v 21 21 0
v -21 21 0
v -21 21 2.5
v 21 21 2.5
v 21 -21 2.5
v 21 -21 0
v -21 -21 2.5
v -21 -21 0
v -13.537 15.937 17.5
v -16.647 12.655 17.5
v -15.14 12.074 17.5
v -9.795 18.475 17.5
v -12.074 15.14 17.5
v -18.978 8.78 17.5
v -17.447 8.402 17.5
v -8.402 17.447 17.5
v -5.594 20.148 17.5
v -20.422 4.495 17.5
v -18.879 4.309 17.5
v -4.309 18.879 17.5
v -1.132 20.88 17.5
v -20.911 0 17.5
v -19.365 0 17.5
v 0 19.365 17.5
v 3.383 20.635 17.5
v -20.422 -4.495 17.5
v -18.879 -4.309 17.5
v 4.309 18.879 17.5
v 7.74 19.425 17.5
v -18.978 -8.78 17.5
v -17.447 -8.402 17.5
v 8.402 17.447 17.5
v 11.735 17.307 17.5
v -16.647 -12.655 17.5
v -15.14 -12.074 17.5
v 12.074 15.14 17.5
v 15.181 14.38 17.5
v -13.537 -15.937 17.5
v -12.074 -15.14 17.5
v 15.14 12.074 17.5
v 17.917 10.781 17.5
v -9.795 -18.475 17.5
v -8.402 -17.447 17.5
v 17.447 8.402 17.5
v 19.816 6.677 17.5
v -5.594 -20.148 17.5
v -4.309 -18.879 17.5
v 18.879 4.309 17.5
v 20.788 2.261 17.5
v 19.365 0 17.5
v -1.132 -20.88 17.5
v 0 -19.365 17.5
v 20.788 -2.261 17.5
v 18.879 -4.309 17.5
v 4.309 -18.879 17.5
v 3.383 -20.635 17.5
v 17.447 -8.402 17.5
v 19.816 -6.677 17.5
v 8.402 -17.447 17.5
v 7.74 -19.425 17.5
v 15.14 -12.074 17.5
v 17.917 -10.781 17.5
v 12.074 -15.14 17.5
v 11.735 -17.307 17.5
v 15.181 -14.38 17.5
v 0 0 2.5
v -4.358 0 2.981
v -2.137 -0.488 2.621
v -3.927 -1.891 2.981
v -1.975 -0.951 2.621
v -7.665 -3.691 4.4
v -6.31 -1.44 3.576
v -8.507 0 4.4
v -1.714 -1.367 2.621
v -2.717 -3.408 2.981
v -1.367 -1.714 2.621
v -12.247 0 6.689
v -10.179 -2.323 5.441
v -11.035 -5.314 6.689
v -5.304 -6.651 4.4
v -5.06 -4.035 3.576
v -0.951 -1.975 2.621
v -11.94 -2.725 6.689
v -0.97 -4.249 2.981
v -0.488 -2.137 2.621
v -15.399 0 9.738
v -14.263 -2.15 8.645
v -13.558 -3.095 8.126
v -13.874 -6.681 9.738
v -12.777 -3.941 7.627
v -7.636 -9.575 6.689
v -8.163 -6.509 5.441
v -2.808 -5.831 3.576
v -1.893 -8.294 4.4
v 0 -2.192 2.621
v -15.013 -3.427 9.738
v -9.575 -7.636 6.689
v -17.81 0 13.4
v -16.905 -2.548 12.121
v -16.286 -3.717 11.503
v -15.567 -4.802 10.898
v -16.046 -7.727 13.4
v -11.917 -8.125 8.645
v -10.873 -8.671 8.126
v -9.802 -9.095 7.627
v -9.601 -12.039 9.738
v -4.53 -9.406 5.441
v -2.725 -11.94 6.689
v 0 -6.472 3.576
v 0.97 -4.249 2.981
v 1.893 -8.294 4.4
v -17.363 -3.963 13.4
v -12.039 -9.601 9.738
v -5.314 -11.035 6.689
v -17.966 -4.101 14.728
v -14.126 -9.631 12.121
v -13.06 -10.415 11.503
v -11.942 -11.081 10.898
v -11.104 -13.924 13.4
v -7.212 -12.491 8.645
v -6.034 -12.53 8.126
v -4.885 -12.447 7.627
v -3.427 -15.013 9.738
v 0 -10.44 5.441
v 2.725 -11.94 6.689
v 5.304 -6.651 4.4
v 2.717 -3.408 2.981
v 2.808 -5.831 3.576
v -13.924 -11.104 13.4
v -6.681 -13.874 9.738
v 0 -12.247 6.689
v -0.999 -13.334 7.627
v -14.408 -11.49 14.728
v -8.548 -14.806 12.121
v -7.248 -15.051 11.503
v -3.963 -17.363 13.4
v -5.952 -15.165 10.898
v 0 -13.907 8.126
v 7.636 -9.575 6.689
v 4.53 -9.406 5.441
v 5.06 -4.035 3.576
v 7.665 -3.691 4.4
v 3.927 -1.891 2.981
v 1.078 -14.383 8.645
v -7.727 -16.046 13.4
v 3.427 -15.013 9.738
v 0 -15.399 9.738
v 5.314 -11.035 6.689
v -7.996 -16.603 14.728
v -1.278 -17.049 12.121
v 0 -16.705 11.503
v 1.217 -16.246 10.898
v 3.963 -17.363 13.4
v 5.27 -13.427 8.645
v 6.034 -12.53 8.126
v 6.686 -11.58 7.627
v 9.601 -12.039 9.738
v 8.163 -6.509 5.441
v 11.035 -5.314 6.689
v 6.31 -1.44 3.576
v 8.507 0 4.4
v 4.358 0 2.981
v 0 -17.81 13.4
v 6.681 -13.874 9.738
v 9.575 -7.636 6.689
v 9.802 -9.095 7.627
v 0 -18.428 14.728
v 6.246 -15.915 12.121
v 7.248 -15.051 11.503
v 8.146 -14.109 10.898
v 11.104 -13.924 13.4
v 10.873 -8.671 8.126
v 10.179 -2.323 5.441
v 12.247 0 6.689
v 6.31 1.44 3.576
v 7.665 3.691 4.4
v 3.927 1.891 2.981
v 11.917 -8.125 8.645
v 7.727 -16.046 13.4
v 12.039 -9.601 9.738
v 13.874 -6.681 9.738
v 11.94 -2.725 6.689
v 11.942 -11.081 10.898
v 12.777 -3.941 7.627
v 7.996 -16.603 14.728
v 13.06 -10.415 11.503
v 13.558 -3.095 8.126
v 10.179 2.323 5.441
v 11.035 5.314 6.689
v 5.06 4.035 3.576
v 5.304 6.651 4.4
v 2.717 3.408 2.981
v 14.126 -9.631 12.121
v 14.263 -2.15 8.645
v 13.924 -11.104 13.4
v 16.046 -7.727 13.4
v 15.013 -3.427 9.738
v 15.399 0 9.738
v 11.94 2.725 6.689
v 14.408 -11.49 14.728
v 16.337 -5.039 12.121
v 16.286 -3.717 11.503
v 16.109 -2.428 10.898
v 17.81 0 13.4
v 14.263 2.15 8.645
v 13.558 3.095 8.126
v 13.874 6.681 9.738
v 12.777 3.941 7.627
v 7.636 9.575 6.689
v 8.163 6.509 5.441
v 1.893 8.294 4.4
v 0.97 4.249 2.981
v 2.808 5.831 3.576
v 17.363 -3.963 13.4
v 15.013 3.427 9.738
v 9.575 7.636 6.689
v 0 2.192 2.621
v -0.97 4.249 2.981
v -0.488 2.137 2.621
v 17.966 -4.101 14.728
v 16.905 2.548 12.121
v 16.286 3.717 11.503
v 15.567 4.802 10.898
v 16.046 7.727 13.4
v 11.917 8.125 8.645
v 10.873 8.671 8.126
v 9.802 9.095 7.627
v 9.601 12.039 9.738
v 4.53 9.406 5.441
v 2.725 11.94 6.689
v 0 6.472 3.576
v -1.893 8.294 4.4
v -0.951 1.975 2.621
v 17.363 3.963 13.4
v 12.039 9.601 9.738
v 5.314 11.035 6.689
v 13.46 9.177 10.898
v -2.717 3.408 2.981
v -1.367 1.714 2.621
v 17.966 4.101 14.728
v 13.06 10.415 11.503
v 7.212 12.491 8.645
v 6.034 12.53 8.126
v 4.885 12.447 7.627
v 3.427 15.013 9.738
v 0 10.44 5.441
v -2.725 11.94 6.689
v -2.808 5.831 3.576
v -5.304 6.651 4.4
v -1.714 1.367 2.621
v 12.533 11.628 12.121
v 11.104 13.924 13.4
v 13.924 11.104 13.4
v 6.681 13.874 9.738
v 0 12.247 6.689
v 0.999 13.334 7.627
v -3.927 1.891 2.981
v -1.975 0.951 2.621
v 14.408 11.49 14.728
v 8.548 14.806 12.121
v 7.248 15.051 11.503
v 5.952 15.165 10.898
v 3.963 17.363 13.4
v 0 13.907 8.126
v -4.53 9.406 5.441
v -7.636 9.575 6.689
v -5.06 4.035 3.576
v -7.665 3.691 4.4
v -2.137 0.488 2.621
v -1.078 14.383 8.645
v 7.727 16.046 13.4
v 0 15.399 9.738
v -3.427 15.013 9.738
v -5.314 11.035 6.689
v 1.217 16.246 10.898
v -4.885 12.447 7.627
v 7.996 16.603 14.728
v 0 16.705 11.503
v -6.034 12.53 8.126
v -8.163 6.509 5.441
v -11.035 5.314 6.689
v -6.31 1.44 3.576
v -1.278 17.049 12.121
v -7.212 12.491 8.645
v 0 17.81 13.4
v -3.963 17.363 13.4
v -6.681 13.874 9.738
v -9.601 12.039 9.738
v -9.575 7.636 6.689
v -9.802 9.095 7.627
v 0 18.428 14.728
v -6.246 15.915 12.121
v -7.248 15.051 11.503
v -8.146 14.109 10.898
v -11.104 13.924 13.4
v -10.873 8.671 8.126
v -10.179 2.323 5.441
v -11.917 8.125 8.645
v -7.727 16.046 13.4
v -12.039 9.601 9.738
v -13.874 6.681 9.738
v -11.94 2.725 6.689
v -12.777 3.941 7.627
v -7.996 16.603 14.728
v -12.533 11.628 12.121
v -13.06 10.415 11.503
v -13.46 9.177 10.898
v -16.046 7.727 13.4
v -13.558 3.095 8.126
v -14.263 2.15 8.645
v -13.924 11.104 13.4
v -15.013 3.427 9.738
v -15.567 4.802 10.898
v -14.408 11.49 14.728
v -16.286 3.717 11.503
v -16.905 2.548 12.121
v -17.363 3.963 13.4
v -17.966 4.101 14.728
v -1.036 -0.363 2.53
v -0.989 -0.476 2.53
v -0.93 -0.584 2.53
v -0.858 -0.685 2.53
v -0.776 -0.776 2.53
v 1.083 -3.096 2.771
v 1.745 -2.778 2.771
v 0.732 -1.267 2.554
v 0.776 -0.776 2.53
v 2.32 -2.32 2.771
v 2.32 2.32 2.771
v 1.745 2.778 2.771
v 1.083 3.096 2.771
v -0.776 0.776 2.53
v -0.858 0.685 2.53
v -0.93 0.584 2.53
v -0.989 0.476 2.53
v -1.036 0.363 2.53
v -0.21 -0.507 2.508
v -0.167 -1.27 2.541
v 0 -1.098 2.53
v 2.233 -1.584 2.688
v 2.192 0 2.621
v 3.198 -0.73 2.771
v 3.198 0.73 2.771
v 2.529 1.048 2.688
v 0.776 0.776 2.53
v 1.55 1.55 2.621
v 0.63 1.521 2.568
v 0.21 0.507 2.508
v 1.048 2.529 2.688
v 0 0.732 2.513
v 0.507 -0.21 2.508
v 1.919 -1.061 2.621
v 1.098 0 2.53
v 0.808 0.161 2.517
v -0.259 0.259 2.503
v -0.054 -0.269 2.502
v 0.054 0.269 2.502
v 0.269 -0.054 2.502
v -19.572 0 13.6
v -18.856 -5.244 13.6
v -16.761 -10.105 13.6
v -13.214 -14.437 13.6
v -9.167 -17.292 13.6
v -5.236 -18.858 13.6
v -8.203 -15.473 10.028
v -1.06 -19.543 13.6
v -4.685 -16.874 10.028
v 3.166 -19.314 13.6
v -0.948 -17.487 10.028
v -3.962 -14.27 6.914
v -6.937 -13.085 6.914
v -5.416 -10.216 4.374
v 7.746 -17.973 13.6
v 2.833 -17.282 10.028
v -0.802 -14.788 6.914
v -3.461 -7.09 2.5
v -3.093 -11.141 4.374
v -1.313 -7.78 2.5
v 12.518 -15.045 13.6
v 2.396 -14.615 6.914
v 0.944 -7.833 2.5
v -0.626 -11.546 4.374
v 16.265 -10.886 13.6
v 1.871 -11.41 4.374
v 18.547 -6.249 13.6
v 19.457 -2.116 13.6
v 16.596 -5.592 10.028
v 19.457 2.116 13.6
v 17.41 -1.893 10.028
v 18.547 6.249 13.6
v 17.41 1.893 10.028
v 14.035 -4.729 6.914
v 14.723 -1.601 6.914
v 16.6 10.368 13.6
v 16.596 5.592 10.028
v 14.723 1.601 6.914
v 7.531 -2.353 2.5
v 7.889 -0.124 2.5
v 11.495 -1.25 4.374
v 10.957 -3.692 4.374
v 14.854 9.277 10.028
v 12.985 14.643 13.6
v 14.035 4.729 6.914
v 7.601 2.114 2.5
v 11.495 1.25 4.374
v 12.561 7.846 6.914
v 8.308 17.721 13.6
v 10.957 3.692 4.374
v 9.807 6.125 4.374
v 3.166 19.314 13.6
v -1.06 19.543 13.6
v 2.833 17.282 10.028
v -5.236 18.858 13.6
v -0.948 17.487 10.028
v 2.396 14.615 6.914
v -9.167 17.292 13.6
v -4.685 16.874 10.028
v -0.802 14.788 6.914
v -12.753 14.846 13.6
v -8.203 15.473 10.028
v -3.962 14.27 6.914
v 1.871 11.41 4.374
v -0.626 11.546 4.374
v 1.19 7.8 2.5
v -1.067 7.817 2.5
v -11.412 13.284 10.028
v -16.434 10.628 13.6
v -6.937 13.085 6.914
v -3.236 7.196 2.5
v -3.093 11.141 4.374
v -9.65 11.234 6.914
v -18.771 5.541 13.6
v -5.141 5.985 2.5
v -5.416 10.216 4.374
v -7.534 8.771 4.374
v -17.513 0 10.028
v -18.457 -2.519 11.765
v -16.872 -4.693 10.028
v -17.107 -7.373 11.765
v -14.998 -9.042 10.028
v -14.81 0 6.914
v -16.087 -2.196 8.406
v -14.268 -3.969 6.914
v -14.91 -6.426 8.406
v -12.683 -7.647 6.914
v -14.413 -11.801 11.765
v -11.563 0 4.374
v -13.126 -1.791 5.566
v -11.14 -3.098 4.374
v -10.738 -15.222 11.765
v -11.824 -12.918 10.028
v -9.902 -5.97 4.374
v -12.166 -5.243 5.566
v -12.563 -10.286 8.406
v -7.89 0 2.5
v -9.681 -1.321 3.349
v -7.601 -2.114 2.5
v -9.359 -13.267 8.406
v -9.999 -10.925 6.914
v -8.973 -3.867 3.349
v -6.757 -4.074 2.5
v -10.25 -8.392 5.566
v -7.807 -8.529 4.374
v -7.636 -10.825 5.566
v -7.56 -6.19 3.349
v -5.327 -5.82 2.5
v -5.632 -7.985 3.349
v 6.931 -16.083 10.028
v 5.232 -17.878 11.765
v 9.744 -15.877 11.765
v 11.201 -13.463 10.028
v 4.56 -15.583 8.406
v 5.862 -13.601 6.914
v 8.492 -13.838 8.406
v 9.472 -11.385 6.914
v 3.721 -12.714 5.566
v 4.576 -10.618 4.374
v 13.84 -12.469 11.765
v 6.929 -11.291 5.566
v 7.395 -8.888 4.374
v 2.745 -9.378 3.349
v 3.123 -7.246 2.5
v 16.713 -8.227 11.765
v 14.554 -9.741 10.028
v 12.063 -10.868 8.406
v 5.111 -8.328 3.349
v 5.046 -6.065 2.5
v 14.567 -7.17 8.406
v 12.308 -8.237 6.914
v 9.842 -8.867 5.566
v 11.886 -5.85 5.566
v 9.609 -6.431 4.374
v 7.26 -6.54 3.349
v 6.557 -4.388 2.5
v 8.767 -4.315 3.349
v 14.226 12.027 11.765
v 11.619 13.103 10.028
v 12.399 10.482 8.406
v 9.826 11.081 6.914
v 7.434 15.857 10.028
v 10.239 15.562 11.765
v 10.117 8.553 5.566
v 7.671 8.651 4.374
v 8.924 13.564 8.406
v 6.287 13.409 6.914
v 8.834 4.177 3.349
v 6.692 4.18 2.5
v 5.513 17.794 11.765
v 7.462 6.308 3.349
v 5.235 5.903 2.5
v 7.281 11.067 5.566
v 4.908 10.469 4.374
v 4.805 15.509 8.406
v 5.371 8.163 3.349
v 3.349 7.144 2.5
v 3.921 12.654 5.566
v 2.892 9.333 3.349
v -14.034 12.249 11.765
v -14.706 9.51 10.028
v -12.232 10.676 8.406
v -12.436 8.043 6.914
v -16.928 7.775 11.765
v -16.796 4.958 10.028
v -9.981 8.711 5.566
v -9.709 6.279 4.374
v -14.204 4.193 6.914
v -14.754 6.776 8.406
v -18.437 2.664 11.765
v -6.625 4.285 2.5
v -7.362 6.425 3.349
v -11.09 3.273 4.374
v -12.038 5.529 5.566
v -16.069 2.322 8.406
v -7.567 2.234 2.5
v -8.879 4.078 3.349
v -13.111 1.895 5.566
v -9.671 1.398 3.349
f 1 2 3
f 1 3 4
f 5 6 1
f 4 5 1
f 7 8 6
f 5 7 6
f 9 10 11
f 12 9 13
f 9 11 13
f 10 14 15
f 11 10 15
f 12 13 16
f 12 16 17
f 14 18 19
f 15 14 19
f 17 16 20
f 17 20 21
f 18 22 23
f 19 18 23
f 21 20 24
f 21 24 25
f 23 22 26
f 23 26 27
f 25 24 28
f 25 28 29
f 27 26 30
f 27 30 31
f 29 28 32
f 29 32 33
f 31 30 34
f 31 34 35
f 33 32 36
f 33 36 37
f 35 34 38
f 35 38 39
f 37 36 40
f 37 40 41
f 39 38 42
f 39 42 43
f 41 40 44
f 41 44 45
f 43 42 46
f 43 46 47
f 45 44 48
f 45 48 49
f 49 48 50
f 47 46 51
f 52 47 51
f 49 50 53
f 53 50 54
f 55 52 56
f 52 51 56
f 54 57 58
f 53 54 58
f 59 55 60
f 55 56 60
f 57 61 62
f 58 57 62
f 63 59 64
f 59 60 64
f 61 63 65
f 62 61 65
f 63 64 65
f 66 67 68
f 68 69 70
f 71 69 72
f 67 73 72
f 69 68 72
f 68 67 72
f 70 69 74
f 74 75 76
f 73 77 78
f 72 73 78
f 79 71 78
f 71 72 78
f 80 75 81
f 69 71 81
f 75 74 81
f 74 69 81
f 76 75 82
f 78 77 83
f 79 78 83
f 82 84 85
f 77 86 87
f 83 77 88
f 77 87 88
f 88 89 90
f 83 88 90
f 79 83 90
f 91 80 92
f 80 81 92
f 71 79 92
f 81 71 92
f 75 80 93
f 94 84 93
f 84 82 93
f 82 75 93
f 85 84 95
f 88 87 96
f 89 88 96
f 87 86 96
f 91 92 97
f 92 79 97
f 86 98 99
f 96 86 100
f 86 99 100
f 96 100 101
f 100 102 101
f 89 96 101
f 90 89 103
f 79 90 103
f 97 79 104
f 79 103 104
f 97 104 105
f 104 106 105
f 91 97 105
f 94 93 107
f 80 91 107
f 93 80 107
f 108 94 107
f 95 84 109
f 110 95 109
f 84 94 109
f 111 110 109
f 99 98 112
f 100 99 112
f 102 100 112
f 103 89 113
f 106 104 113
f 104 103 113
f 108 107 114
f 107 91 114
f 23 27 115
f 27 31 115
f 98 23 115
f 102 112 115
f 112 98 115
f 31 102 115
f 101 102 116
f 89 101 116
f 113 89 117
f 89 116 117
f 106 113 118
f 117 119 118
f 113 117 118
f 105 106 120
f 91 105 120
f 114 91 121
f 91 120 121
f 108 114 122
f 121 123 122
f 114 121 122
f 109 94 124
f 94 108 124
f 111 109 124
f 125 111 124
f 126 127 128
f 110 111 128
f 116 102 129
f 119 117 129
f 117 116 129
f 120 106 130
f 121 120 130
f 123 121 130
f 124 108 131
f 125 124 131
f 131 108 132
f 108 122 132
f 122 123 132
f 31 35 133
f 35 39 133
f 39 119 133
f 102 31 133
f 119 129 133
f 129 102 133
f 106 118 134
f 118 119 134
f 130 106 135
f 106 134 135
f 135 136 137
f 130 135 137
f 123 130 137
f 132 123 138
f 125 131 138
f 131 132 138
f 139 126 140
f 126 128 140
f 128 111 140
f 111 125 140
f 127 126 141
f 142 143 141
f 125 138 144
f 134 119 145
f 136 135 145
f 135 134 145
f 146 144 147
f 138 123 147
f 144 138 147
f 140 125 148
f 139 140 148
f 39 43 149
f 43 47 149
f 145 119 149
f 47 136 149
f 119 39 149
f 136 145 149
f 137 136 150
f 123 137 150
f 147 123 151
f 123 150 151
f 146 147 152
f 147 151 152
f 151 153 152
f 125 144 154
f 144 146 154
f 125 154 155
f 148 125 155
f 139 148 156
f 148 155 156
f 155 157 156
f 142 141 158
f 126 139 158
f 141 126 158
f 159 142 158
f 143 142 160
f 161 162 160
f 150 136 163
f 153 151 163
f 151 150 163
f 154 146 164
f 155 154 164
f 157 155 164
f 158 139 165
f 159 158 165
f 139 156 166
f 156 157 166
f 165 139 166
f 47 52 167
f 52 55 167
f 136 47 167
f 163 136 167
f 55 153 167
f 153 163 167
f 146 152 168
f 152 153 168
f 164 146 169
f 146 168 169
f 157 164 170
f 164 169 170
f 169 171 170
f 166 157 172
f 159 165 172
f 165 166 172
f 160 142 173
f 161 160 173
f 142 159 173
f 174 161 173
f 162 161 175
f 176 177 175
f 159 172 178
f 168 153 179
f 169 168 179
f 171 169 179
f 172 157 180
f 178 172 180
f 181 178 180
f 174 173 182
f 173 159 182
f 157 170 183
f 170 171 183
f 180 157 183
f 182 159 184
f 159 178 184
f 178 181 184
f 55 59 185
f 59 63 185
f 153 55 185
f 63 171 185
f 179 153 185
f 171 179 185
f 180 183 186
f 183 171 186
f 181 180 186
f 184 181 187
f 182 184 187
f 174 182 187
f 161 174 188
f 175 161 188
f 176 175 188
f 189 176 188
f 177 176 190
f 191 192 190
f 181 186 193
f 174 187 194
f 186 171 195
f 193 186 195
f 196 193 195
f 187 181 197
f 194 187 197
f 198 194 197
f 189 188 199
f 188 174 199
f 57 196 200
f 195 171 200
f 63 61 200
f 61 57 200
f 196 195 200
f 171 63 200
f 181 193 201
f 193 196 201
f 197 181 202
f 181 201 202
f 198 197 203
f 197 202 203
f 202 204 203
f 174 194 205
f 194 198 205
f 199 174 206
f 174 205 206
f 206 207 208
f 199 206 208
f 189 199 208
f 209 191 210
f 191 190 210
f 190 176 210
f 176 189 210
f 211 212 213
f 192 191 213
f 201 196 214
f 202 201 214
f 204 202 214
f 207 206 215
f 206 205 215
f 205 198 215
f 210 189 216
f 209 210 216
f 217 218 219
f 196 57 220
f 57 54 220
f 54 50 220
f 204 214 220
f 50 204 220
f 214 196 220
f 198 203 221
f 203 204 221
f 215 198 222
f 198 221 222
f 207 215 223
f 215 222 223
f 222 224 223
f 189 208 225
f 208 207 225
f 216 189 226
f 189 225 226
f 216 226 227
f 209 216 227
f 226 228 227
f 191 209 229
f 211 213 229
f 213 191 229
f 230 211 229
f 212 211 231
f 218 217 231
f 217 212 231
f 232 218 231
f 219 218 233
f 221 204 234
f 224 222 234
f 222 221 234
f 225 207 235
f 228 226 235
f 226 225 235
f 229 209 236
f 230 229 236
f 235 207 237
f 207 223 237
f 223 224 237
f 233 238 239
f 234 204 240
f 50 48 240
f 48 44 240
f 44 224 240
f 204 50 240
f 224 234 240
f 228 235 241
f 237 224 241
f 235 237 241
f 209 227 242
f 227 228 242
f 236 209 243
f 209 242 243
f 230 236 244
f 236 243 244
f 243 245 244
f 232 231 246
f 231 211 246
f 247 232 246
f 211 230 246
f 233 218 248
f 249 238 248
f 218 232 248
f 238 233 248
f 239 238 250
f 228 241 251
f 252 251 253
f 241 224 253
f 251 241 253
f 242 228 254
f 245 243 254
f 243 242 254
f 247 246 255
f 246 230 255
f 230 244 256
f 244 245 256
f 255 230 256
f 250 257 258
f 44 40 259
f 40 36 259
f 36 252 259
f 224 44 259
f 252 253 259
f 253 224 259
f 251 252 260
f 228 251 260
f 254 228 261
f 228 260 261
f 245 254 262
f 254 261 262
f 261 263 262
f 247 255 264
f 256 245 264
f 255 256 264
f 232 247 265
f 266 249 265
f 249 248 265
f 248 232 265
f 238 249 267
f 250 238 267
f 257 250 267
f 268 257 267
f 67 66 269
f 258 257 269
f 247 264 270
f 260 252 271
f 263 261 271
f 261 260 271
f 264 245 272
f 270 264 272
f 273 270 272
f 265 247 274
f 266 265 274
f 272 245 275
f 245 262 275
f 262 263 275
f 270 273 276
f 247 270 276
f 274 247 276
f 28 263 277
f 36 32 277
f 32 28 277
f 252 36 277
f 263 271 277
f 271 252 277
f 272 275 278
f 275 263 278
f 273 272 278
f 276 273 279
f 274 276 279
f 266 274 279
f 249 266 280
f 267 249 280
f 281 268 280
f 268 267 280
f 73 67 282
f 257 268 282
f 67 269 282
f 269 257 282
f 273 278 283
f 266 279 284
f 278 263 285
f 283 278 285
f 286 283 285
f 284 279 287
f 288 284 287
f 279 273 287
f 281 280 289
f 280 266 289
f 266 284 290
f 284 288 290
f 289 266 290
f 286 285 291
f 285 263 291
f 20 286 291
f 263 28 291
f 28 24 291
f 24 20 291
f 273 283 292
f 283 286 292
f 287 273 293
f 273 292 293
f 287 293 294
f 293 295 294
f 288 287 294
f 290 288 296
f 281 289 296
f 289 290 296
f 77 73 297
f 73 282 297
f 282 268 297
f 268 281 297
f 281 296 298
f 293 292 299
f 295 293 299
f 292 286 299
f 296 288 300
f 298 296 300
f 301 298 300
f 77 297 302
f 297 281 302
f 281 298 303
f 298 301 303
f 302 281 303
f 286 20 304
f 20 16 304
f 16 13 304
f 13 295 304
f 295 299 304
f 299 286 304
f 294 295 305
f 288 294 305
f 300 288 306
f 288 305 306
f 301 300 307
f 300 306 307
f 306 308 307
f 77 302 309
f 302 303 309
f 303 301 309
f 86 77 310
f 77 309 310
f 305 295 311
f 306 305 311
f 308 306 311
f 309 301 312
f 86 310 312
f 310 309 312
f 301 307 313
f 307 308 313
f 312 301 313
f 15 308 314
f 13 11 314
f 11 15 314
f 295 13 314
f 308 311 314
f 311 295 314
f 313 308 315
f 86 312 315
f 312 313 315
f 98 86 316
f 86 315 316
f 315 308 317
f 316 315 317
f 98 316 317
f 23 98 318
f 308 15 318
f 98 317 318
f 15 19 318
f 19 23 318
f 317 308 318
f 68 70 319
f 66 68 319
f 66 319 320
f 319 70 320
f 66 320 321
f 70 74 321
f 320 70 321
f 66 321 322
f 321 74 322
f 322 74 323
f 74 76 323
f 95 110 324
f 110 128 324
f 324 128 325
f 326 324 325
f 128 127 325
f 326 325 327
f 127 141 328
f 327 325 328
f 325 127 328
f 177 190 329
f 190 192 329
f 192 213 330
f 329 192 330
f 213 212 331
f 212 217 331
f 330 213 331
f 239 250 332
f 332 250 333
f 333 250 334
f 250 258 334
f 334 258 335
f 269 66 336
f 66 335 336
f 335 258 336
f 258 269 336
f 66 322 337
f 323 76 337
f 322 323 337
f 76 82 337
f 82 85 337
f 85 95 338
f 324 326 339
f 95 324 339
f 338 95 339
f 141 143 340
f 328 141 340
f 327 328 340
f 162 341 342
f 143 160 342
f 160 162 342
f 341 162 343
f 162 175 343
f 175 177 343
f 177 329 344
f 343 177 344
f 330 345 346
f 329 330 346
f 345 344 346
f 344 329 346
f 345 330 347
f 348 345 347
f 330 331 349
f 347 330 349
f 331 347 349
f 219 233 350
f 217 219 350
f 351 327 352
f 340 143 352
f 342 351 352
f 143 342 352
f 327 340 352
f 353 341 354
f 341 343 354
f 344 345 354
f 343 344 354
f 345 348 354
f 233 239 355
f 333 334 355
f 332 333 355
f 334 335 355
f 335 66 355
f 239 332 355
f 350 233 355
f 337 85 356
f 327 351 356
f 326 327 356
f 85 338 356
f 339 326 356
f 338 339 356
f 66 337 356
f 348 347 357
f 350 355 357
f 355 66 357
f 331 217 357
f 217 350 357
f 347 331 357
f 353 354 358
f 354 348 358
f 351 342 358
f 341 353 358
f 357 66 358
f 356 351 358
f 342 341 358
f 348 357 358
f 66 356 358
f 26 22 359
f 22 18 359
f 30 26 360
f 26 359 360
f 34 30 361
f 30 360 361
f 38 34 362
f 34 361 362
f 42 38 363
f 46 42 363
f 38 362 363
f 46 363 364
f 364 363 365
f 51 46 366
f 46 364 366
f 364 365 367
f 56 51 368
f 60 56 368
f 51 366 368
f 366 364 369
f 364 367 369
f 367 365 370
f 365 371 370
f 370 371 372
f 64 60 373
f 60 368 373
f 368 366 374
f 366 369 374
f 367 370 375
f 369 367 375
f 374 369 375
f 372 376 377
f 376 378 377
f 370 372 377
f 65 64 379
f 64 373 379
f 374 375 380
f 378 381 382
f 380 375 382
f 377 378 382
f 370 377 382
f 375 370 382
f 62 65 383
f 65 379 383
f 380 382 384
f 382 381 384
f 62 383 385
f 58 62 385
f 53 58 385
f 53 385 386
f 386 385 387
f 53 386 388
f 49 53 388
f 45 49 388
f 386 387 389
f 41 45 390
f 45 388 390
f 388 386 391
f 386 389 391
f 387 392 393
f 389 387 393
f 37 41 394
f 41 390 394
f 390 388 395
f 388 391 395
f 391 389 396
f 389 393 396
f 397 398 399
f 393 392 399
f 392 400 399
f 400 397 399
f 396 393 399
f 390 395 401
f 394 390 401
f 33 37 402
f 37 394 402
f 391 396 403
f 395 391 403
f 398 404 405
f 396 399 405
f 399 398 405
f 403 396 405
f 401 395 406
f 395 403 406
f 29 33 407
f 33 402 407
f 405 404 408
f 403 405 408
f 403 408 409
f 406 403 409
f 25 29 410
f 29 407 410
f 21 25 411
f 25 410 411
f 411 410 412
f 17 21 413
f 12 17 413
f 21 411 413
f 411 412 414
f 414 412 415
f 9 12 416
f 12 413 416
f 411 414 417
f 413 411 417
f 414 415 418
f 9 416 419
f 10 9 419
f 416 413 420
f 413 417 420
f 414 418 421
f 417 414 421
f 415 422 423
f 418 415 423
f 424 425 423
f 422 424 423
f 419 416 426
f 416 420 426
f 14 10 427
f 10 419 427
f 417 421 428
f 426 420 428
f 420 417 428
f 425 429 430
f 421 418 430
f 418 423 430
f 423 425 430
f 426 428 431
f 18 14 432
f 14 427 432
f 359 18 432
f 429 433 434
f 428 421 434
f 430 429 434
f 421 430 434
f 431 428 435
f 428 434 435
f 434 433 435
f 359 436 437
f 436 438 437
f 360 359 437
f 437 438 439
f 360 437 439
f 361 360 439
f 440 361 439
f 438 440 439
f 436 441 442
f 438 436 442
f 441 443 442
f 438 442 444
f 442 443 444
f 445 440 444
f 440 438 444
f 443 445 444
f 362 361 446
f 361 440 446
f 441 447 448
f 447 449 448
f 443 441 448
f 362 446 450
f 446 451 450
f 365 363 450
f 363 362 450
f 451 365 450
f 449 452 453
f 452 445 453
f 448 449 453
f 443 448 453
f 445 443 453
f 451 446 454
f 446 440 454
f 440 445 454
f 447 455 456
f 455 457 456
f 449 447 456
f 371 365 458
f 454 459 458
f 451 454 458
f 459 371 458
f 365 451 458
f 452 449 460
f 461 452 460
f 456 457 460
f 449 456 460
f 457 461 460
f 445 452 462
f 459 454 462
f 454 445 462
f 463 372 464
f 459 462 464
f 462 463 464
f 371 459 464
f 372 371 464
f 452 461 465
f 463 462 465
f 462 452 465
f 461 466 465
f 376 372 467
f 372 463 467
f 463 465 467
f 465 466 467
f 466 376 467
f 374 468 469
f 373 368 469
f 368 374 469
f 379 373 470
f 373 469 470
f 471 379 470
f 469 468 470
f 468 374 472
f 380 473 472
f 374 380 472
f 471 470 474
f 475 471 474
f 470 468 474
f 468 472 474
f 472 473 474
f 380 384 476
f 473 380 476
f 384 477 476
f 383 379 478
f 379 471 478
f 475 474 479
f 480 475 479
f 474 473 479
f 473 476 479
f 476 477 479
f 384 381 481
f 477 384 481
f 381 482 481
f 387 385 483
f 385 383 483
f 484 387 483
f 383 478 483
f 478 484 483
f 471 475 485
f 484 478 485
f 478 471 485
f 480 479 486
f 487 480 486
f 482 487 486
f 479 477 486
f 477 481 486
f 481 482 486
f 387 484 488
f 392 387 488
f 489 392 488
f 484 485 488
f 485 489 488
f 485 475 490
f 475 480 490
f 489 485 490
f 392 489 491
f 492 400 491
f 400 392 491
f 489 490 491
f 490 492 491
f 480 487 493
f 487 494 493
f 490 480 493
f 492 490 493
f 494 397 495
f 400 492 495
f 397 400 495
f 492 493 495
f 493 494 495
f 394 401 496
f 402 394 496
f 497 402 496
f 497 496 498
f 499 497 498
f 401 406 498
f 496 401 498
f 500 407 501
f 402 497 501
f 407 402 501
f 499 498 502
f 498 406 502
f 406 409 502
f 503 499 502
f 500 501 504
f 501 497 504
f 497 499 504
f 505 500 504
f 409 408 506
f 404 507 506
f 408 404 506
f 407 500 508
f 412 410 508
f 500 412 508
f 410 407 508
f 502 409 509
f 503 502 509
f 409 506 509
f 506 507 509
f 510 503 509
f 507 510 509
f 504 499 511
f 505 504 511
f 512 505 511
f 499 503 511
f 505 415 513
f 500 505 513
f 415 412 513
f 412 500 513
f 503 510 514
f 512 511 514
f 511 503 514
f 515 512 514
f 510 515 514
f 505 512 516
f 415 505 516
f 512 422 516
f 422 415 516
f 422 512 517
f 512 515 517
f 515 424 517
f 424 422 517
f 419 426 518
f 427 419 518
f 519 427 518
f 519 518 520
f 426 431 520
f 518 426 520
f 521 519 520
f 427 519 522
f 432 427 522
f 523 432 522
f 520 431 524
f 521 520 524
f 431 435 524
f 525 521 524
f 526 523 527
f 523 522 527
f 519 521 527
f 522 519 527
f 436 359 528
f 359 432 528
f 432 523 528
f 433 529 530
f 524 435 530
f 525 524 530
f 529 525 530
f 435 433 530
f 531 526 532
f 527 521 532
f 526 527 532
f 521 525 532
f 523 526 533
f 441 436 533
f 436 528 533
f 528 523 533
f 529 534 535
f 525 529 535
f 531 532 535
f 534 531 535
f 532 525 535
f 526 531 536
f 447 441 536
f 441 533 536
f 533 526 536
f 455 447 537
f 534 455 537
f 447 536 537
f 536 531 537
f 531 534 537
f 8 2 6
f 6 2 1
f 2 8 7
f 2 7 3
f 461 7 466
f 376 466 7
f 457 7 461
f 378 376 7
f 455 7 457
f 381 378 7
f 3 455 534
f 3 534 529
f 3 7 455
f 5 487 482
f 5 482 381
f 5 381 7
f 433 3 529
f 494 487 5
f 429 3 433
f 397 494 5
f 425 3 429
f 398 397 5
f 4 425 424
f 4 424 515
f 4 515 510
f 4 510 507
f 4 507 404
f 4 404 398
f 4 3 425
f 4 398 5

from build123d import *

# Parameters (mm, degrees)
F0_W     = 42
F0_H     = 42
F1_DEPTH = 2.5


with BuildPart() as f1:
    # F0 (on Top) → F1 (new body)
    with BuildSketch(Plane.XY):
        Rectangle(F0_W, F0_H)
    extrude(amount=F1_DEPTH)

    # F2 (on Front) → F3 (revolve)
    with BuildSketch(Plane.XZ):
        with BuildLine():
            ThreePointArc((-20.910524, 17.5), (-13.318221, 5.62176), (0, 1))
            Line((0, 1), (0, 2.5))
            ThreePointArc((0, 2.5), (-12.247449, 6.688612), (-19.364917, 17.5))
            Line((-19.364917, 17.5), (-20.910524, 17.5))
        make_face()
    revolve(axis=Axis((0, 0, 8.75), (0, 0, 1)))


solid = f1.part
